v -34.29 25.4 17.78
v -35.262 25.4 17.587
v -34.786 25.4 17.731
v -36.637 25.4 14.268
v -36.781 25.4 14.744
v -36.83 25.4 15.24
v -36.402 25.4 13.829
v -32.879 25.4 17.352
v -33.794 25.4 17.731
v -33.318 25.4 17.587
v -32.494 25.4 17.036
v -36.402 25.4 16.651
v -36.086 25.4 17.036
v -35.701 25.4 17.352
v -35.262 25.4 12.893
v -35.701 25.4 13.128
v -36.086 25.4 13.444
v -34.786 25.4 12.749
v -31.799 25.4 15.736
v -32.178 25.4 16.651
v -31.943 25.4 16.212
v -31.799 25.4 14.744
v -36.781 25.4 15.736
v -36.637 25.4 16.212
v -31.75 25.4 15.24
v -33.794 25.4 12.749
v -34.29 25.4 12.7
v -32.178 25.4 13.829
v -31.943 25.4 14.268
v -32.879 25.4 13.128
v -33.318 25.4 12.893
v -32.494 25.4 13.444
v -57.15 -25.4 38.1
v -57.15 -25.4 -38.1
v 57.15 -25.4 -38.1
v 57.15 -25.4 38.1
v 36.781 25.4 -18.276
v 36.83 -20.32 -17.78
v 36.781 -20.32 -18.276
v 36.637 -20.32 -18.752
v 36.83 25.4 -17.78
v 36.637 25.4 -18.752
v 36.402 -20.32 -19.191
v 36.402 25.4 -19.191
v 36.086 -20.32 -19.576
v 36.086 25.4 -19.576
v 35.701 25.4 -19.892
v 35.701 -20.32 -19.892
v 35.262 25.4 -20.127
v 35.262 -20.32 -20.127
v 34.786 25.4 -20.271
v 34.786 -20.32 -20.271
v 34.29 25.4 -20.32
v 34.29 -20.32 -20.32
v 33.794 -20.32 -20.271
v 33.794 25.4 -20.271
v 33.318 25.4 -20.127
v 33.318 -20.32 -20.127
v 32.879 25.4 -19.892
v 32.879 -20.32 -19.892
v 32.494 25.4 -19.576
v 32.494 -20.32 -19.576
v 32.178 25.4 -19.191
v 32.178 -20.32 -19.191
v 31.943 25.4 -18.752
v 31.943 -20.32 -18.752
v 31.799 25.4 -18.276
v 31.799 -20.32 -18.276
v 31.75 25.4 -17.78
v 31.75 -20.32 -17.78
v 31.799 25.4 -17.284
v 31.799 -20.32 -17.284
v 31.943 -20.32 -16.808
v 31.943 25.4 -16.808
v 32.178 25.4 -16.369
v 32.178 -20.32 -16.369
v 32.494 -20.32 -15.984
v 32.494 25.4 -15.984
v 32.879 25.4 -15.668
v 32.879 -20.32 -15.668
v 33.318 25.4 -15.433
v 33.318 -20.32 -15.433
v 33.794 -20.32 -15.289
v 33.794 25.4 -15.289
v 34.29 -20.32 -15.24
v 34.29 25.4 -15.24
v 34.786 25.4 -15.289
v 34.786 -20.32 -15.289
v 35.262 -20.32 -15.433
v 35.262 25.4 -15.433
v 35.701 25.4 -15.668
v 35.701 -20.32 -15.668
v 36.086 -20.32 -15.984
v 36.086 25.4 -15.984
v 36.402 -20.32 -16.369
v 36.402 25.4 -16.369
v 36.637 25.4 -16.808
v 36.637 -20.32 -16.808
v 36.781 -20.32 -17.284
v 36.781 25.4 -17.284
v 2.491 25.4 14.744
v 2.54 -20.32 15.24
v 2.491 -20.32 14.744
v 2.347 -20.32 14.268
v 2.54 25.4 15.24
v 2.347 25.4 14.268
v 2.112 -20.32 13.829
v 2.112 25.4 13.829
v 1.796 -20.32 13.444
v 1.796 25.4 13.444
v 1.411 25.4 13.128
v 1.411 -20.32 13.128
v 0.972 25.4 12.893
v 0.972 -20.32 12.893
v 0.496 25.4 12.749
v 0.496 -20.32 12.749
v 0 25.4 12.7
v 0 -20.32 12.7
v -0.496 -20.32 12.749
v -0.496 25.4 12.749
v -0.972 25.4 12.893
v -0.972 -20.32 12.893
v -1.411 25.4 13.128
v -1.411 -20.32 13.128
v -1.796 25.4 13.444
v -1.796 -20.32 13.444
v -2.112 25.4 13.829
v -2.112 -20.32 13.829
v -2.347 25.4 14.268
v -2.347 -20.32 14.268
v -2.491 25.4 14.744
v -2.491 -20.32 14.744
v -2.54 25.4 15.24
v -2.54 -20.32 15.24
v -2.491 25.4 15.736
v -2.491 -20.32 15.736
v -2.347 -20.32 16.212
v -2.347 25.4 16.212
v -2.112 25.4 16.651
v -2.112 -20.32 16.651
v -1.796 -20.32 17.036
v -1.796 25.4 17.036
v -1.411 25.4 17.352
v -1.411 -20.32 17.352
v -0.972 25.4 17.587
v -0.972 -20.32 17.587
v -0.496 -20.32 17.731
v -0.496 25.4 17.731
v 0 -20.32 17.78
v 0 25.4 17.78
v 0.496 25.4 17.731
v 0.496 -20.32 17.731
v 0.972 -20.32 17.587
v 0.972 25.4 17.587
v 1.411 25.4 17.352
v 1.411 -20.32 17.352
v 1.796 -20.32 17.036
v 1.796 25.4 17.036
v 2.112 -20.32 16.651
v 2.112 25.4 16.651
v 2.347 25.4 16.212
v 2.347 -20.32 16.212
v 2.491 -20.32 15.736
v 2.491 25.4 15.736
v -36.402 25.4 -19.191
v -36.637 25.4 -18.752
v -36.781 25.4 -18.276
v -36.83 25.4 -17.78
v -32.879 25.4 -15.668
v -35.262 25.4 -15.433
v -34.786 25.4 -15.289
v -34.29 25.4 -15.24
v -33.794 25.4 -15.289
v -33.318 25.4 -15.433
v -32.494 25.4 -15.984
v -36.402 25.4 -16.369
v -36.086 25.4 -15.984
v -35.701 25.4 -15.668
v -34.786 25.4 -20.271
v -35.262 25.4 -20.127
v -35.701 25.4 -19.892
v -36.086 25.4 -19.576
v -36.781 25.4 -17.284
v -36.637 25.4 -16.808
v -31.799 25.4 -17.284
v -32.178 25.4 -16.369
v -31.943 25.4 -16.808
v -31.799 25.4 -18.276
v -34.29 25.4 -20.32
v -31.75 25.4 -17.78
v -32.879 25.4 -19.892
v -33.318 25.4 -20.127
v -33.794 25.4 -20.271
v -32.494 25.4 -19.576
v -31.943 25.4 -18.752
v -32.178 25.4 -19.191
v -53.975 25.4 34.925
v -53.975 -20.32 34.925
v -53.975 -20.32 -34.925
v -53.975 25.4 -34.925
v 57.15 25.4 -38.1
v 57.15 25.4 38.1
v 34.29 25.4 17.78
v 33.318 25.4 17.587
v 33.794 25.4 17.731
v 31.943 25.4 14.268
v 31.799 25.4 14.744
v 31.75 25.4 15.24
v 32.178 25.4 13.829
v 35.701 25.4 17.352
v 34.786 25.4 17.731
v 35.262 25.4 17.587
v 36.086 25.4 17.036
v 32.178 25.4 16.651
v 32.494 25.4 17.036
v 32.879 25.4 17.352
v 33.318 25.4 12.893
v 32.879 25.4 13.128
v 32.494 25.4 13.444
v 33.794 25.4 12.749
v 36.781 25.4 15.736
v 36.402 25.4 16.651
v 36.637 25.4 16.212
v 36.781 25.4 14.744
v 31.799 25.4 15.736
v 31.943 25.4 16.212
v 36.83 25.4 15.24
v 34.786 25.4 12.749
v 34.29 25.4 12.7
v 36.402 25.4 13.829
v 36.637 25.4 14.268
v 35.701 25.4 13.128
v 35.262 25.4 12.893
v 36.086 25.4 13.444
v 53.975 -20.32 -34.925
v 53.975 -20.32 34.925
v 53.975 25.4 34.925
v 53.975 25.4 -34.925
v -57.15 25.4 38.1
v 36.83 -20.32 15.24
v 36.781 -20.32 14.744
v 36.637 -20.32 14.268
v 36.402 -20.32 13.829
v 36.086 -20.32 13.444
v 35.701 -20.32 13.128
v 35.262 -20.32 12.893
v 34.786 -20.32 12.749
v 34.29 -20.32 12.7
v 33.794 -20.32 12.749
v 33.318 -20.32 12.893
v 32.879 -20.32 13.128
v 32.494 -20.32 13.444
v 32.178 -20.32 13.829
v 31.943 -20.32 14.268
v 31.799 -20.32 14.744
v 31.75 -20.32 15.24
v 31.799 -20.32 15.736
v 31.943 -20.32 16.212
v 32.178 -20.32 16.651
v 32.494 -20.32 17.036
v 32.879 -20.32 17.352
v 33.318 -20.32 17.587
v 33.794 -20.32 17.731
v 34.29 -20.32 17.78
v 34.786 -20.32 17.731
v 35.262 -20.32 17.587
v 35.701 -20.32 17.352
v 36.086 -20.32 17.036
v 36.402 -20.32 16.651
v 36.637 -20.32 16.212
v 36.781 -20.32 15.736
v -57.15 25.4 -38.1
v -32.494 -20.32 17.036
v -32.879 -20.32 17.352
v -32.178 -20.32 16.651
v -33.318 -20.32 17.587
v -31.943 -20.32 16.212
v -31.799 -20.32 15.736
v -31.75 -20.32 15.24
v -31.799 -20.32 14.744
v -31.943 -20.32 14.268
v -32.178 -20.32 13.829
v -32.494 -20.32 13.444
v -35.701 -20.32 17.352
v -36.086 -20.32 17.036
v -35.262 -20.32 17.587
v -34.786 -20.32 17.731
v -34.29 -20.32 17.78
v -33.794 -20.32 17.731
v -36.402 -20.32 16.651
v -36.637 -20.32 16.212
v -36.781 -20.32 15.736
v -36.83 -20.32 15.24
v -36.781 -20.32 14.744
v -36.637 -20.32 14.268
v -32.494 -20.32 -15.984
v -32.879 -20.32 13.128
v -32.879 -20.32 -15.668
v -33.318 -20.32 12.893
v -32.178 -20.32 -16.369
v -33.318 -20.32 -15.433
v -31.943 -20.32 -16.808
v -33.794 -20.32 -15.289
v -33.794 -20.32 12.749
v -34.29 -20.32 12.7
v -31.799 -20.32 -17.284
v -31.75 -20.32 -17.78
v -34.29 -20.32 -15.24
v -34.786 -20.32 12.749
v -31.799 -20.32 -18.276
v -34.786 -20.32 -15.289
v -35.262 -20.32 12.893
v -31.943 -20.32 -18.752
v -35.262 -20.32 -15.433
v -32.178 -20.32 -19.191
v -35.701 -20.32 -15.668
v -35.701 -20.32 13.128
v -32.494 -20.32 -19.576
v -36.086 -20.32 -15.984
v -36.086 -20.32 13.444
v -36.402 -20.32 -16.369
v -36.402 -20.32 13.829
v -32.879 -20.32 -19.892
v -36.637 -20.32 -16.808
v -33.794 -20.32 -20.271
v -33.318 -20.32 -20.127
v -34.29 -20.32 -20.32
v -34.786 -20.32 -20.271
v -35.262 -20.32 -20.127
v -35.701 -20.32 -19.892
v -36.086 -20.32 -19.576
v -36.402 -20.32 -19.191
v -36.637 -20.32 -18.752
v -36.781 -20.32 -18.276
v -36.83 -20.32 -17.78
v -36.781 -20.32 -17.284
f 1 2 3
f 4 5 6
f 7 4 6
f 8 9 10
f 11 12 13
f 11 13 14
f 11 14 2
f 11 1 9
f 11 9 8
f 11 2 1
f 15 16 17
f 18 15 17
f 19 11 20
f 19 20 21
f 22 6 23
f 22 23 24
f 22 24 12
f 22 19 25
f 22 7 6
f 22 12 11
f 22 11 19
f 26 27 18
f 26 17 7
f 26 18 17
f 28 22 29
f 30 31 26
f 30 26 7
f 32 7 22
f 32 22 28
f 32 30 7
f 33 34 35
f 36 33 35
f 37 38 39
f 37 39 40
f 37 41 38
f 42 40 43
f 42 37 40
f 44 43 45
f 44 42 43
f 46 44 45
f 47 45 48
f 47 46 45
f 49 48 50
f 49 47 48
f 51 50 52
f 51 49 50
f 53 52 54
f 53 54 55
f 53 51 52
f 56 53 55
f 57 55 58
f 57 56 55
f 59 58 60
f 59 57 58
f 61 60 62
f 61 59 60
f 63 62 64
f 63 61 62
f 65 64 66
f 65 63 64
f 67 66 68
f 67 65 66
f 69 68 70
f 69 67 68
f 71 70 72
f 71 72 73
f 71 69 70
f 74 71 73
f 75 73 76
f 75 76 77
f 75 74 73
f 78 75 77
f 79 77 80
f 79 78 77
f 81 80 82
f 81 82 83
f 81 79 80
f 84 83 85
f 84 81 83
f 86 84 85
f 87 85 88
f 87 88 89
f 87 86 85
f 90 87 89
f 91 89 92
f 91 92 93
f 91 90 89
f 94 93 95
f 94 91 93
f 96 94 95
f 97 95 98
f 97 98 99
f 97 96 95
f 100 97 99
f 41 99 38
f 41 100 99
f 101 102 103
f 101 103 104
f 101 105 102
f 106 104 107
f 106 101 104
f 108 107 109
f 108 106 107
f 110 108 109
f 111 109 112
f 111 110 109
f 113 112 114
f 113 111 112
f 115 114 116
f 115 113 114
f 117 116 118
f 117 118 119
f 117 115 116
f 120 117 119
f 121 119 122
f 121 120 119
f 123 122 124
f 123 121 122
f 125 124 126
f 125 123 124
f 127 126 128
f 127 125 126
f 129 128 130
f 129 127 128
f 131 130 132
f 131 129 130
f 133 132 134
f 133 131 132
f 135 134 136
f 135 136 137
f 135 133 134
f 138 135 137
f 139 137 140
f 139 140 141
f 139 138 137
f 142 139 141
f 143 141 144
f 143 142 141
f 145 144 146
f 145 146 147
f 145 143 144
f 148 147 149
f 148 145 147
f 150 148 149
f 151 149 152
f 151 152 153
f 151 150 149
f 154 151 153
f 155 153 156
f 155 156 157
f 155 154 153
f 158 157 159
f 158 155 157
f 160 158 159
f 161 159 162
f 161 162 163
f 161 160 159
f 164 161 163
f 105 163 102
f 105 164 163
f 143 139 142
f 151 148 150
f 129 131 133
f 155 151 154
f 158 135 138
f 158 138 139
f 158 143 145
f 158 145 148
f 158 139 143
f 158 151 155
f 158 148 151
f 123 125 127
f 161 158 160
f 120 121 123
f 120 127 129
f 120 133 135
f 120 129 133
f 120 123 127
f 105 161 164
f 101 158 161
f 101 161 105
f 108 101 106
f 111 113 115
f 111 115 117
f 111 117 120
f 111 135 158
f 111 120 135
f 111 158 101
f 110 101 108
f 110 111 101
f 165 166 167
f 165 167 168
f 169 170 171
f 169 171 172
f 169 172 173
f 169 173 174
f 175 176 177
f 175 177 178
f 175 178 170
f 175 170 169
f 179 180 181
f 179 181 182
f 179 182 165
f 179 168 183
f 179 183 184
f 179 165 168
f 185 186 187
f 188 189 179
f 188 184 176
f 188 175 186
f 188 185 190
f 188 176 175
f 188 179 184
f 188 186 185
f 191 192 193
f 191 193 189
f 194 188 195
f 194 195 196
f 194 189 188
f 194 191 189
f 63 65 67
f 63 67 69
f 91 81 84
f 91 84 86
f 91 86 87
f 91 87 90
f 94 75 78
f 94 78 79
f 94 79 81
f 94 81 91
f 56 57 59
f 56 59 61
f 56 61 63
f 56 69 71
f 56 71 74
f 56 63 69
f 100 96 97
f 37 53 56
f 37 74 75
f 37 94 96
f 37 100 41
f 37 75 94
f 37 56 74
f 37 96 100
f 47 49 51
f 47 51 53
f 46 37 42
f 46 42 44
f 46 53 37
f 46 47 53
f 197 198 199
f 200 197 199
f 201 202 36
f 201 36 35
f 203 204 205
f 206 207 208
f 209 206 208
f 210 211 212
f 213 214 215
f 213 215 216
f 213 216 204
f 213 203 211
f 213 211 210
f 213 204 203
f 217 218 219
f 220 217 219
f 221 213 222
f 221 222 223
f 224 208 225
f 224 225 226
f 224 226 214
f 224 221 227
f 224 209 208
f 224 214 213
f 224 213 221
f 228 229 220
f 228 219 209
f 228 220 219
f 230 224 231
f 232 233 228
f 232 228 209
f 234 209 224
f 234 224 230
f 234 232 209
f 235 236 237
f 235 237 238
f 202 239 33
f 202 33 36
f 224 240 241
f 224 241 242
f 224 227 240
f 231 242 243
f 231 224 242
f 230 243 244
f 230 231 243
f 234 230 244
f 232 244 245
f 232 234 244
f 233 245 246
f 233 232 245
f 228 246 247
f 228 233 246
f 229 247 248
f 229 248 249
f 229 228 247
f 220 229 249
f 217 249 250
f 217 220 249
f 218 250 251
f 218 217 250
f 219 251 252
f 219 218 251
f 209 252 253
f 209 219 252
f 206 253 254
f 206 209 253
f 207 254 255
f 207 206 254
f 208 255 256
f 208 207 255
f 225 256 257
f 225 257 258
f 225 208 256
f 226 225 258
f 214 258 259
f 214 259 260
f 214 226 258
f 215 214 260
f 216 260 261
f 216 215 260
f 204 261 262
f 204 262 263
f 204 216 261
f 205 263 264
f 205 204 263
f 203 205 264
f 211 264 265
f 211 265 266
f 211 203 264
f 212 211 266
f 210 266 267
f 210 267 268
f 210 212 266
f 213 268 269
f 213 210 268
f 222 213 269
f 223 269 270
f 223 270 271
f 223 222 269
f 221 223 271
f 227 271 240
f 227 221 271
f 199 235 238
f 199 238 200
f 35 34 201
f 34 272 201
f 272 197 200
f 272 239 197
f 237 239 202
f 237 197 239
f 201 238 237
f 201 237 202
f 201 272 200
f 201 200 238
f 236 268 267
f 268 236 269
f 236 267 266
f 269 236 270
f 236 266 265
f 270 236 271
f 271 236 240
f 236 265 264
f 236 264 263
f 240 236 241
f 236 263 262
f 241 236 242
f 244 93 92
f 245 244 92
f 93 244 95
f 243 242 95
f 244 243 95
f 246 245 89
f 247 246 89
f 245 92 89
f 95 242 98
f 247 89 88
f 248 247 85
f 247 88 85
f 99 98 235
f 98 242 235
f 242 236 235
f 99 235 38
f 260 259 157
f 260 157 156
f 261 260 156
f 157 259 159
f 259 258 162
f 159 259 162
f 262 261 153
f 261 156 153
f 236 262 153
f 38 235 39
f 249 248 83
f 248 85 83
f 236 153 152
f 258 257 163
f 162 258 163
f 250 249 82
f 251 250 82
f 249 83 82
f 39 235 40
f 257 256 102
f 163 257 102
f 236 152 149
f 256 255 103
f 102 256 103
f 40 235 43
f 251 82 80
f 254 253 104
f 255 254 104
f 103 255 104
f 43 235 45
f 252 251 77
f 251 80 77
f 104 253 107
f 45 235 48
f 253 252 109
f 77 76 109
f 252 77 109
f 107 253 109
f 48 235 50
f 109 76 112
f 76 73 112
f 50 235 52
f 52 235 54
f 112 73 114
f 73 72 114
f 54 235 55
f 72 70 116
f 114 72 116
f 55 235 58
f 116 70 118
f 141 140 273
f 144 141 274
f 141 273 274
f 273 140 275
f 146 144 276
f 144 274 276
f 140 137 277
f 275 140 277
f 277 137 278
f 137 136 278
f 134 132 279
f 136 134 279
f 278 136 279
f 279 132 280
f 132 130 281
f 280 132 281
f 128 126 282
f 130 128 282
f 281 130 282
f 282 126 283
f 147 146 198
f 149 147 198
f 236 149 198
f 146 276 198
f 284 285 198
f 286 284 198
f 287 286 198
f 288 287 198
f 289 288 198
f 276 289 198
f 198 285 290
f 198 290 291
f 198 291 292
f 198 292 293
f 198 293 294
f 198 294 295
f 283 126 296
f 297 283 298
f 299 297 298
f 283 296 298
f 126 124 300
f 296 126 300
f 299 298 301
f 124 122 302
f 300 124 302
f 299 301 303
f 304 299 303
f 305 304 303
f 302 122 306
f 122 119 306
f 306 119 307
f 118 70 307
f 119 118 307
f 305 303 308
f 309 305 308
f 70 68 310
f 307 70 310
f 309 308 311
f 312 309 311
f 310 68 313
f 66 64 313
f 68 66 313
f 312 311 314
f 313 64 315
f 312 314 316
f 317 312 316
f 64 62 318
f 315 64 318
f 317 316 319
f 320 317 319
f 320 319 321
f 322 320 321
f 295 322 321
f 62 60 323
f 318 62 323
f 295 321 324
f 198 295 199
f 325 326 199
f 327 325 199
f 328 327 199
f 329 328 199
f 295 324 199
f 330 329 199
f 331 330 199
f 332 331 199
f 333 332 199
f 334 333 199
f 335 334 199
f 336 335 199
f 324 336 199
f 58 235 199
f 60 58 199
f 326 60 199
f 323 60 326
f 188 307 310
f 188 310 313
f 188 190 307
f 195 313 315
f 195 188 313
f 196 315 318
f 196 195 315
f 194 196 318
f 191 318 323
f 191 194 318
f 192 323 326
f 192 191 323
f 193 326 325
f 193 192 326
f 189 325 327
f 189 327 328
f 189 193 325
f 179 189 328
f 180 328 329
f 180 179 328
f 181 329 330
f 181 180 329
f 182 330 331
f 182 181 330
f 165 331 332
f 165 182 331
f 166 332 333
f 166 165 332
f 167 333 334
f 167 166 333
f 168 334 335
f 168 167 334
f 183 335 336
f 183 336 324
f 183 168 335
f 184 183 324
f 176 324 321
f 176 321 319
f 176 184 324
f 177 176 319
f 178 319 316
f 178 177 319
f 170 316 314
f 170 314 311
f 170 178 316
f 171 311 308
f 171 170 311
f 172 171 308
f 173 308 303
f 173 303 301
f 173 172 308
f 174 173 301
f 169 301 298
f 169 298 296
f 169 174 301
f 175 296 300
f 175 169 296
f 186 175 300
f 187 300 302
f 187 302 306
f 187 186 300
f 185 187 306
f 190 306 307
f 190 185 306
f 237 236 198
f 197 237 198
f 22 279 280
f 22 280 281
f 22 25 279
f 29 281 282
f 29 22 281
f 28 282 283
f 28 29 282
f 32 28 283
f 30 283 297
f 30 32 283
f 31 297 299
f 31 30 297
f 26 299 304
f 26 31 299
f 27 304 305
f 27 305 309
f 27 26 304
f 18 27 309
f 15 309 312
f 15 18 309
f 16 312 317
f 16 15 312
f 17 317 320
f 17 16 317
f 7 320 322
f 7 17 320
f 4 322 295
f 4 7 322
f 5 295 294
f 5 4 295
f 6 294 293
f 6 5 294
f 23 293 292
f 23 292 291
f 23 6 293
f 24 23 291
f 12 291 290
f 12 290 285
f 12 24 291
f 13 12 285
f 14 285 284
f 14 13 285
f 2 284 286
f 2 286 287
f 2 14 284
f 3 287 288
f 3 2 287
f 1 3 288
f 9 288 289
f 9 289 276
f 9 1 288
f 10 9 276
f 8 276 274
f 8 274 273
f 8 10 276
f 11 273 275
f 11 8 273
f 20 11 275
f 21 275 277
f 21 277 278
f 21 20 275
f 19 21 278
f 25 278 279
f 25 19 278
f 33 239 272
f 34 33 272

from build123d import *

# Parameters (mm, degrees)
SKETCH4_W           = 114.3
SKETCH4_H           = 76.2
BOSS_EXTRUDE2_DEPTH = 25.4
CUT_EXTRUDE1_REACH  = 47.72
SKETCH5_W           = 107.95
SKETCH5_H           = 69.85
SKETCH6_R           = 2.54
BOSS_EXTRUDE3_DEPTH = 25.4


with BuildPart() as part:
    # Sketch4 → Boss-Extrude2 (new body, symmetric)
    with BuildSketch(Plane(origin=(0, 0, 0), x_dir=(1, 0, 0), z_dir=(0, 1, 0))):
        Rectangle(SKETCH4_W, SKETCH4_H)
    extrude(amount=BOSS_EXTRUDE2_DEPTH, both=True)

    # Sketch5 → Cut-Extrude1 (cut, up to next)
    with BuildSketch(Plane(origin=(0, -20.32, 0), x_dir=(-1, 0, 0), z_dir=(0, -1, 0)), mode=Mode.PRIVATE) as cut_extrude1_sk1:
        Rectangle(SKETCH5_W, SKETCH5_H)
    cut_extrude1_tool1 = extrude(cut_extrude1_sk1.sketch, amount=-CUT_EXTRUDE1_REACH, mode=Mode.PRIVATE) & part.part
    add(cut_extrude1_tool1.solids().sort_by_distance((0, -20.32, 0))[0], mode=Mode.SUBTRACT)

    # Sketch6 → Boss-Extrude3 (add, symmetric)
    with BuildSketch(Plane(origin=(0, 0, 0), x_dir=(1, 0, 0), z_dir=(0, 1, 0))):
        with Locations((34.29, 17.78)):
            Circle(SKETCH6_R)
        with Locations((34.29, -15.24)):
            Circle(SKETCH6_R)
        with Locations((0, -15.24)):
            Circle(SKETCH6_R)
        with Locations((-34.29, -15.24)):
            Circle(SKETCH6_R)
        with Locations((-34.29, 17.78)):
            Circle(SKETCH6_R)
    extrude(amount=BOSS_EXTRUDE3_DEPTH, both=True)


solid = part.part
